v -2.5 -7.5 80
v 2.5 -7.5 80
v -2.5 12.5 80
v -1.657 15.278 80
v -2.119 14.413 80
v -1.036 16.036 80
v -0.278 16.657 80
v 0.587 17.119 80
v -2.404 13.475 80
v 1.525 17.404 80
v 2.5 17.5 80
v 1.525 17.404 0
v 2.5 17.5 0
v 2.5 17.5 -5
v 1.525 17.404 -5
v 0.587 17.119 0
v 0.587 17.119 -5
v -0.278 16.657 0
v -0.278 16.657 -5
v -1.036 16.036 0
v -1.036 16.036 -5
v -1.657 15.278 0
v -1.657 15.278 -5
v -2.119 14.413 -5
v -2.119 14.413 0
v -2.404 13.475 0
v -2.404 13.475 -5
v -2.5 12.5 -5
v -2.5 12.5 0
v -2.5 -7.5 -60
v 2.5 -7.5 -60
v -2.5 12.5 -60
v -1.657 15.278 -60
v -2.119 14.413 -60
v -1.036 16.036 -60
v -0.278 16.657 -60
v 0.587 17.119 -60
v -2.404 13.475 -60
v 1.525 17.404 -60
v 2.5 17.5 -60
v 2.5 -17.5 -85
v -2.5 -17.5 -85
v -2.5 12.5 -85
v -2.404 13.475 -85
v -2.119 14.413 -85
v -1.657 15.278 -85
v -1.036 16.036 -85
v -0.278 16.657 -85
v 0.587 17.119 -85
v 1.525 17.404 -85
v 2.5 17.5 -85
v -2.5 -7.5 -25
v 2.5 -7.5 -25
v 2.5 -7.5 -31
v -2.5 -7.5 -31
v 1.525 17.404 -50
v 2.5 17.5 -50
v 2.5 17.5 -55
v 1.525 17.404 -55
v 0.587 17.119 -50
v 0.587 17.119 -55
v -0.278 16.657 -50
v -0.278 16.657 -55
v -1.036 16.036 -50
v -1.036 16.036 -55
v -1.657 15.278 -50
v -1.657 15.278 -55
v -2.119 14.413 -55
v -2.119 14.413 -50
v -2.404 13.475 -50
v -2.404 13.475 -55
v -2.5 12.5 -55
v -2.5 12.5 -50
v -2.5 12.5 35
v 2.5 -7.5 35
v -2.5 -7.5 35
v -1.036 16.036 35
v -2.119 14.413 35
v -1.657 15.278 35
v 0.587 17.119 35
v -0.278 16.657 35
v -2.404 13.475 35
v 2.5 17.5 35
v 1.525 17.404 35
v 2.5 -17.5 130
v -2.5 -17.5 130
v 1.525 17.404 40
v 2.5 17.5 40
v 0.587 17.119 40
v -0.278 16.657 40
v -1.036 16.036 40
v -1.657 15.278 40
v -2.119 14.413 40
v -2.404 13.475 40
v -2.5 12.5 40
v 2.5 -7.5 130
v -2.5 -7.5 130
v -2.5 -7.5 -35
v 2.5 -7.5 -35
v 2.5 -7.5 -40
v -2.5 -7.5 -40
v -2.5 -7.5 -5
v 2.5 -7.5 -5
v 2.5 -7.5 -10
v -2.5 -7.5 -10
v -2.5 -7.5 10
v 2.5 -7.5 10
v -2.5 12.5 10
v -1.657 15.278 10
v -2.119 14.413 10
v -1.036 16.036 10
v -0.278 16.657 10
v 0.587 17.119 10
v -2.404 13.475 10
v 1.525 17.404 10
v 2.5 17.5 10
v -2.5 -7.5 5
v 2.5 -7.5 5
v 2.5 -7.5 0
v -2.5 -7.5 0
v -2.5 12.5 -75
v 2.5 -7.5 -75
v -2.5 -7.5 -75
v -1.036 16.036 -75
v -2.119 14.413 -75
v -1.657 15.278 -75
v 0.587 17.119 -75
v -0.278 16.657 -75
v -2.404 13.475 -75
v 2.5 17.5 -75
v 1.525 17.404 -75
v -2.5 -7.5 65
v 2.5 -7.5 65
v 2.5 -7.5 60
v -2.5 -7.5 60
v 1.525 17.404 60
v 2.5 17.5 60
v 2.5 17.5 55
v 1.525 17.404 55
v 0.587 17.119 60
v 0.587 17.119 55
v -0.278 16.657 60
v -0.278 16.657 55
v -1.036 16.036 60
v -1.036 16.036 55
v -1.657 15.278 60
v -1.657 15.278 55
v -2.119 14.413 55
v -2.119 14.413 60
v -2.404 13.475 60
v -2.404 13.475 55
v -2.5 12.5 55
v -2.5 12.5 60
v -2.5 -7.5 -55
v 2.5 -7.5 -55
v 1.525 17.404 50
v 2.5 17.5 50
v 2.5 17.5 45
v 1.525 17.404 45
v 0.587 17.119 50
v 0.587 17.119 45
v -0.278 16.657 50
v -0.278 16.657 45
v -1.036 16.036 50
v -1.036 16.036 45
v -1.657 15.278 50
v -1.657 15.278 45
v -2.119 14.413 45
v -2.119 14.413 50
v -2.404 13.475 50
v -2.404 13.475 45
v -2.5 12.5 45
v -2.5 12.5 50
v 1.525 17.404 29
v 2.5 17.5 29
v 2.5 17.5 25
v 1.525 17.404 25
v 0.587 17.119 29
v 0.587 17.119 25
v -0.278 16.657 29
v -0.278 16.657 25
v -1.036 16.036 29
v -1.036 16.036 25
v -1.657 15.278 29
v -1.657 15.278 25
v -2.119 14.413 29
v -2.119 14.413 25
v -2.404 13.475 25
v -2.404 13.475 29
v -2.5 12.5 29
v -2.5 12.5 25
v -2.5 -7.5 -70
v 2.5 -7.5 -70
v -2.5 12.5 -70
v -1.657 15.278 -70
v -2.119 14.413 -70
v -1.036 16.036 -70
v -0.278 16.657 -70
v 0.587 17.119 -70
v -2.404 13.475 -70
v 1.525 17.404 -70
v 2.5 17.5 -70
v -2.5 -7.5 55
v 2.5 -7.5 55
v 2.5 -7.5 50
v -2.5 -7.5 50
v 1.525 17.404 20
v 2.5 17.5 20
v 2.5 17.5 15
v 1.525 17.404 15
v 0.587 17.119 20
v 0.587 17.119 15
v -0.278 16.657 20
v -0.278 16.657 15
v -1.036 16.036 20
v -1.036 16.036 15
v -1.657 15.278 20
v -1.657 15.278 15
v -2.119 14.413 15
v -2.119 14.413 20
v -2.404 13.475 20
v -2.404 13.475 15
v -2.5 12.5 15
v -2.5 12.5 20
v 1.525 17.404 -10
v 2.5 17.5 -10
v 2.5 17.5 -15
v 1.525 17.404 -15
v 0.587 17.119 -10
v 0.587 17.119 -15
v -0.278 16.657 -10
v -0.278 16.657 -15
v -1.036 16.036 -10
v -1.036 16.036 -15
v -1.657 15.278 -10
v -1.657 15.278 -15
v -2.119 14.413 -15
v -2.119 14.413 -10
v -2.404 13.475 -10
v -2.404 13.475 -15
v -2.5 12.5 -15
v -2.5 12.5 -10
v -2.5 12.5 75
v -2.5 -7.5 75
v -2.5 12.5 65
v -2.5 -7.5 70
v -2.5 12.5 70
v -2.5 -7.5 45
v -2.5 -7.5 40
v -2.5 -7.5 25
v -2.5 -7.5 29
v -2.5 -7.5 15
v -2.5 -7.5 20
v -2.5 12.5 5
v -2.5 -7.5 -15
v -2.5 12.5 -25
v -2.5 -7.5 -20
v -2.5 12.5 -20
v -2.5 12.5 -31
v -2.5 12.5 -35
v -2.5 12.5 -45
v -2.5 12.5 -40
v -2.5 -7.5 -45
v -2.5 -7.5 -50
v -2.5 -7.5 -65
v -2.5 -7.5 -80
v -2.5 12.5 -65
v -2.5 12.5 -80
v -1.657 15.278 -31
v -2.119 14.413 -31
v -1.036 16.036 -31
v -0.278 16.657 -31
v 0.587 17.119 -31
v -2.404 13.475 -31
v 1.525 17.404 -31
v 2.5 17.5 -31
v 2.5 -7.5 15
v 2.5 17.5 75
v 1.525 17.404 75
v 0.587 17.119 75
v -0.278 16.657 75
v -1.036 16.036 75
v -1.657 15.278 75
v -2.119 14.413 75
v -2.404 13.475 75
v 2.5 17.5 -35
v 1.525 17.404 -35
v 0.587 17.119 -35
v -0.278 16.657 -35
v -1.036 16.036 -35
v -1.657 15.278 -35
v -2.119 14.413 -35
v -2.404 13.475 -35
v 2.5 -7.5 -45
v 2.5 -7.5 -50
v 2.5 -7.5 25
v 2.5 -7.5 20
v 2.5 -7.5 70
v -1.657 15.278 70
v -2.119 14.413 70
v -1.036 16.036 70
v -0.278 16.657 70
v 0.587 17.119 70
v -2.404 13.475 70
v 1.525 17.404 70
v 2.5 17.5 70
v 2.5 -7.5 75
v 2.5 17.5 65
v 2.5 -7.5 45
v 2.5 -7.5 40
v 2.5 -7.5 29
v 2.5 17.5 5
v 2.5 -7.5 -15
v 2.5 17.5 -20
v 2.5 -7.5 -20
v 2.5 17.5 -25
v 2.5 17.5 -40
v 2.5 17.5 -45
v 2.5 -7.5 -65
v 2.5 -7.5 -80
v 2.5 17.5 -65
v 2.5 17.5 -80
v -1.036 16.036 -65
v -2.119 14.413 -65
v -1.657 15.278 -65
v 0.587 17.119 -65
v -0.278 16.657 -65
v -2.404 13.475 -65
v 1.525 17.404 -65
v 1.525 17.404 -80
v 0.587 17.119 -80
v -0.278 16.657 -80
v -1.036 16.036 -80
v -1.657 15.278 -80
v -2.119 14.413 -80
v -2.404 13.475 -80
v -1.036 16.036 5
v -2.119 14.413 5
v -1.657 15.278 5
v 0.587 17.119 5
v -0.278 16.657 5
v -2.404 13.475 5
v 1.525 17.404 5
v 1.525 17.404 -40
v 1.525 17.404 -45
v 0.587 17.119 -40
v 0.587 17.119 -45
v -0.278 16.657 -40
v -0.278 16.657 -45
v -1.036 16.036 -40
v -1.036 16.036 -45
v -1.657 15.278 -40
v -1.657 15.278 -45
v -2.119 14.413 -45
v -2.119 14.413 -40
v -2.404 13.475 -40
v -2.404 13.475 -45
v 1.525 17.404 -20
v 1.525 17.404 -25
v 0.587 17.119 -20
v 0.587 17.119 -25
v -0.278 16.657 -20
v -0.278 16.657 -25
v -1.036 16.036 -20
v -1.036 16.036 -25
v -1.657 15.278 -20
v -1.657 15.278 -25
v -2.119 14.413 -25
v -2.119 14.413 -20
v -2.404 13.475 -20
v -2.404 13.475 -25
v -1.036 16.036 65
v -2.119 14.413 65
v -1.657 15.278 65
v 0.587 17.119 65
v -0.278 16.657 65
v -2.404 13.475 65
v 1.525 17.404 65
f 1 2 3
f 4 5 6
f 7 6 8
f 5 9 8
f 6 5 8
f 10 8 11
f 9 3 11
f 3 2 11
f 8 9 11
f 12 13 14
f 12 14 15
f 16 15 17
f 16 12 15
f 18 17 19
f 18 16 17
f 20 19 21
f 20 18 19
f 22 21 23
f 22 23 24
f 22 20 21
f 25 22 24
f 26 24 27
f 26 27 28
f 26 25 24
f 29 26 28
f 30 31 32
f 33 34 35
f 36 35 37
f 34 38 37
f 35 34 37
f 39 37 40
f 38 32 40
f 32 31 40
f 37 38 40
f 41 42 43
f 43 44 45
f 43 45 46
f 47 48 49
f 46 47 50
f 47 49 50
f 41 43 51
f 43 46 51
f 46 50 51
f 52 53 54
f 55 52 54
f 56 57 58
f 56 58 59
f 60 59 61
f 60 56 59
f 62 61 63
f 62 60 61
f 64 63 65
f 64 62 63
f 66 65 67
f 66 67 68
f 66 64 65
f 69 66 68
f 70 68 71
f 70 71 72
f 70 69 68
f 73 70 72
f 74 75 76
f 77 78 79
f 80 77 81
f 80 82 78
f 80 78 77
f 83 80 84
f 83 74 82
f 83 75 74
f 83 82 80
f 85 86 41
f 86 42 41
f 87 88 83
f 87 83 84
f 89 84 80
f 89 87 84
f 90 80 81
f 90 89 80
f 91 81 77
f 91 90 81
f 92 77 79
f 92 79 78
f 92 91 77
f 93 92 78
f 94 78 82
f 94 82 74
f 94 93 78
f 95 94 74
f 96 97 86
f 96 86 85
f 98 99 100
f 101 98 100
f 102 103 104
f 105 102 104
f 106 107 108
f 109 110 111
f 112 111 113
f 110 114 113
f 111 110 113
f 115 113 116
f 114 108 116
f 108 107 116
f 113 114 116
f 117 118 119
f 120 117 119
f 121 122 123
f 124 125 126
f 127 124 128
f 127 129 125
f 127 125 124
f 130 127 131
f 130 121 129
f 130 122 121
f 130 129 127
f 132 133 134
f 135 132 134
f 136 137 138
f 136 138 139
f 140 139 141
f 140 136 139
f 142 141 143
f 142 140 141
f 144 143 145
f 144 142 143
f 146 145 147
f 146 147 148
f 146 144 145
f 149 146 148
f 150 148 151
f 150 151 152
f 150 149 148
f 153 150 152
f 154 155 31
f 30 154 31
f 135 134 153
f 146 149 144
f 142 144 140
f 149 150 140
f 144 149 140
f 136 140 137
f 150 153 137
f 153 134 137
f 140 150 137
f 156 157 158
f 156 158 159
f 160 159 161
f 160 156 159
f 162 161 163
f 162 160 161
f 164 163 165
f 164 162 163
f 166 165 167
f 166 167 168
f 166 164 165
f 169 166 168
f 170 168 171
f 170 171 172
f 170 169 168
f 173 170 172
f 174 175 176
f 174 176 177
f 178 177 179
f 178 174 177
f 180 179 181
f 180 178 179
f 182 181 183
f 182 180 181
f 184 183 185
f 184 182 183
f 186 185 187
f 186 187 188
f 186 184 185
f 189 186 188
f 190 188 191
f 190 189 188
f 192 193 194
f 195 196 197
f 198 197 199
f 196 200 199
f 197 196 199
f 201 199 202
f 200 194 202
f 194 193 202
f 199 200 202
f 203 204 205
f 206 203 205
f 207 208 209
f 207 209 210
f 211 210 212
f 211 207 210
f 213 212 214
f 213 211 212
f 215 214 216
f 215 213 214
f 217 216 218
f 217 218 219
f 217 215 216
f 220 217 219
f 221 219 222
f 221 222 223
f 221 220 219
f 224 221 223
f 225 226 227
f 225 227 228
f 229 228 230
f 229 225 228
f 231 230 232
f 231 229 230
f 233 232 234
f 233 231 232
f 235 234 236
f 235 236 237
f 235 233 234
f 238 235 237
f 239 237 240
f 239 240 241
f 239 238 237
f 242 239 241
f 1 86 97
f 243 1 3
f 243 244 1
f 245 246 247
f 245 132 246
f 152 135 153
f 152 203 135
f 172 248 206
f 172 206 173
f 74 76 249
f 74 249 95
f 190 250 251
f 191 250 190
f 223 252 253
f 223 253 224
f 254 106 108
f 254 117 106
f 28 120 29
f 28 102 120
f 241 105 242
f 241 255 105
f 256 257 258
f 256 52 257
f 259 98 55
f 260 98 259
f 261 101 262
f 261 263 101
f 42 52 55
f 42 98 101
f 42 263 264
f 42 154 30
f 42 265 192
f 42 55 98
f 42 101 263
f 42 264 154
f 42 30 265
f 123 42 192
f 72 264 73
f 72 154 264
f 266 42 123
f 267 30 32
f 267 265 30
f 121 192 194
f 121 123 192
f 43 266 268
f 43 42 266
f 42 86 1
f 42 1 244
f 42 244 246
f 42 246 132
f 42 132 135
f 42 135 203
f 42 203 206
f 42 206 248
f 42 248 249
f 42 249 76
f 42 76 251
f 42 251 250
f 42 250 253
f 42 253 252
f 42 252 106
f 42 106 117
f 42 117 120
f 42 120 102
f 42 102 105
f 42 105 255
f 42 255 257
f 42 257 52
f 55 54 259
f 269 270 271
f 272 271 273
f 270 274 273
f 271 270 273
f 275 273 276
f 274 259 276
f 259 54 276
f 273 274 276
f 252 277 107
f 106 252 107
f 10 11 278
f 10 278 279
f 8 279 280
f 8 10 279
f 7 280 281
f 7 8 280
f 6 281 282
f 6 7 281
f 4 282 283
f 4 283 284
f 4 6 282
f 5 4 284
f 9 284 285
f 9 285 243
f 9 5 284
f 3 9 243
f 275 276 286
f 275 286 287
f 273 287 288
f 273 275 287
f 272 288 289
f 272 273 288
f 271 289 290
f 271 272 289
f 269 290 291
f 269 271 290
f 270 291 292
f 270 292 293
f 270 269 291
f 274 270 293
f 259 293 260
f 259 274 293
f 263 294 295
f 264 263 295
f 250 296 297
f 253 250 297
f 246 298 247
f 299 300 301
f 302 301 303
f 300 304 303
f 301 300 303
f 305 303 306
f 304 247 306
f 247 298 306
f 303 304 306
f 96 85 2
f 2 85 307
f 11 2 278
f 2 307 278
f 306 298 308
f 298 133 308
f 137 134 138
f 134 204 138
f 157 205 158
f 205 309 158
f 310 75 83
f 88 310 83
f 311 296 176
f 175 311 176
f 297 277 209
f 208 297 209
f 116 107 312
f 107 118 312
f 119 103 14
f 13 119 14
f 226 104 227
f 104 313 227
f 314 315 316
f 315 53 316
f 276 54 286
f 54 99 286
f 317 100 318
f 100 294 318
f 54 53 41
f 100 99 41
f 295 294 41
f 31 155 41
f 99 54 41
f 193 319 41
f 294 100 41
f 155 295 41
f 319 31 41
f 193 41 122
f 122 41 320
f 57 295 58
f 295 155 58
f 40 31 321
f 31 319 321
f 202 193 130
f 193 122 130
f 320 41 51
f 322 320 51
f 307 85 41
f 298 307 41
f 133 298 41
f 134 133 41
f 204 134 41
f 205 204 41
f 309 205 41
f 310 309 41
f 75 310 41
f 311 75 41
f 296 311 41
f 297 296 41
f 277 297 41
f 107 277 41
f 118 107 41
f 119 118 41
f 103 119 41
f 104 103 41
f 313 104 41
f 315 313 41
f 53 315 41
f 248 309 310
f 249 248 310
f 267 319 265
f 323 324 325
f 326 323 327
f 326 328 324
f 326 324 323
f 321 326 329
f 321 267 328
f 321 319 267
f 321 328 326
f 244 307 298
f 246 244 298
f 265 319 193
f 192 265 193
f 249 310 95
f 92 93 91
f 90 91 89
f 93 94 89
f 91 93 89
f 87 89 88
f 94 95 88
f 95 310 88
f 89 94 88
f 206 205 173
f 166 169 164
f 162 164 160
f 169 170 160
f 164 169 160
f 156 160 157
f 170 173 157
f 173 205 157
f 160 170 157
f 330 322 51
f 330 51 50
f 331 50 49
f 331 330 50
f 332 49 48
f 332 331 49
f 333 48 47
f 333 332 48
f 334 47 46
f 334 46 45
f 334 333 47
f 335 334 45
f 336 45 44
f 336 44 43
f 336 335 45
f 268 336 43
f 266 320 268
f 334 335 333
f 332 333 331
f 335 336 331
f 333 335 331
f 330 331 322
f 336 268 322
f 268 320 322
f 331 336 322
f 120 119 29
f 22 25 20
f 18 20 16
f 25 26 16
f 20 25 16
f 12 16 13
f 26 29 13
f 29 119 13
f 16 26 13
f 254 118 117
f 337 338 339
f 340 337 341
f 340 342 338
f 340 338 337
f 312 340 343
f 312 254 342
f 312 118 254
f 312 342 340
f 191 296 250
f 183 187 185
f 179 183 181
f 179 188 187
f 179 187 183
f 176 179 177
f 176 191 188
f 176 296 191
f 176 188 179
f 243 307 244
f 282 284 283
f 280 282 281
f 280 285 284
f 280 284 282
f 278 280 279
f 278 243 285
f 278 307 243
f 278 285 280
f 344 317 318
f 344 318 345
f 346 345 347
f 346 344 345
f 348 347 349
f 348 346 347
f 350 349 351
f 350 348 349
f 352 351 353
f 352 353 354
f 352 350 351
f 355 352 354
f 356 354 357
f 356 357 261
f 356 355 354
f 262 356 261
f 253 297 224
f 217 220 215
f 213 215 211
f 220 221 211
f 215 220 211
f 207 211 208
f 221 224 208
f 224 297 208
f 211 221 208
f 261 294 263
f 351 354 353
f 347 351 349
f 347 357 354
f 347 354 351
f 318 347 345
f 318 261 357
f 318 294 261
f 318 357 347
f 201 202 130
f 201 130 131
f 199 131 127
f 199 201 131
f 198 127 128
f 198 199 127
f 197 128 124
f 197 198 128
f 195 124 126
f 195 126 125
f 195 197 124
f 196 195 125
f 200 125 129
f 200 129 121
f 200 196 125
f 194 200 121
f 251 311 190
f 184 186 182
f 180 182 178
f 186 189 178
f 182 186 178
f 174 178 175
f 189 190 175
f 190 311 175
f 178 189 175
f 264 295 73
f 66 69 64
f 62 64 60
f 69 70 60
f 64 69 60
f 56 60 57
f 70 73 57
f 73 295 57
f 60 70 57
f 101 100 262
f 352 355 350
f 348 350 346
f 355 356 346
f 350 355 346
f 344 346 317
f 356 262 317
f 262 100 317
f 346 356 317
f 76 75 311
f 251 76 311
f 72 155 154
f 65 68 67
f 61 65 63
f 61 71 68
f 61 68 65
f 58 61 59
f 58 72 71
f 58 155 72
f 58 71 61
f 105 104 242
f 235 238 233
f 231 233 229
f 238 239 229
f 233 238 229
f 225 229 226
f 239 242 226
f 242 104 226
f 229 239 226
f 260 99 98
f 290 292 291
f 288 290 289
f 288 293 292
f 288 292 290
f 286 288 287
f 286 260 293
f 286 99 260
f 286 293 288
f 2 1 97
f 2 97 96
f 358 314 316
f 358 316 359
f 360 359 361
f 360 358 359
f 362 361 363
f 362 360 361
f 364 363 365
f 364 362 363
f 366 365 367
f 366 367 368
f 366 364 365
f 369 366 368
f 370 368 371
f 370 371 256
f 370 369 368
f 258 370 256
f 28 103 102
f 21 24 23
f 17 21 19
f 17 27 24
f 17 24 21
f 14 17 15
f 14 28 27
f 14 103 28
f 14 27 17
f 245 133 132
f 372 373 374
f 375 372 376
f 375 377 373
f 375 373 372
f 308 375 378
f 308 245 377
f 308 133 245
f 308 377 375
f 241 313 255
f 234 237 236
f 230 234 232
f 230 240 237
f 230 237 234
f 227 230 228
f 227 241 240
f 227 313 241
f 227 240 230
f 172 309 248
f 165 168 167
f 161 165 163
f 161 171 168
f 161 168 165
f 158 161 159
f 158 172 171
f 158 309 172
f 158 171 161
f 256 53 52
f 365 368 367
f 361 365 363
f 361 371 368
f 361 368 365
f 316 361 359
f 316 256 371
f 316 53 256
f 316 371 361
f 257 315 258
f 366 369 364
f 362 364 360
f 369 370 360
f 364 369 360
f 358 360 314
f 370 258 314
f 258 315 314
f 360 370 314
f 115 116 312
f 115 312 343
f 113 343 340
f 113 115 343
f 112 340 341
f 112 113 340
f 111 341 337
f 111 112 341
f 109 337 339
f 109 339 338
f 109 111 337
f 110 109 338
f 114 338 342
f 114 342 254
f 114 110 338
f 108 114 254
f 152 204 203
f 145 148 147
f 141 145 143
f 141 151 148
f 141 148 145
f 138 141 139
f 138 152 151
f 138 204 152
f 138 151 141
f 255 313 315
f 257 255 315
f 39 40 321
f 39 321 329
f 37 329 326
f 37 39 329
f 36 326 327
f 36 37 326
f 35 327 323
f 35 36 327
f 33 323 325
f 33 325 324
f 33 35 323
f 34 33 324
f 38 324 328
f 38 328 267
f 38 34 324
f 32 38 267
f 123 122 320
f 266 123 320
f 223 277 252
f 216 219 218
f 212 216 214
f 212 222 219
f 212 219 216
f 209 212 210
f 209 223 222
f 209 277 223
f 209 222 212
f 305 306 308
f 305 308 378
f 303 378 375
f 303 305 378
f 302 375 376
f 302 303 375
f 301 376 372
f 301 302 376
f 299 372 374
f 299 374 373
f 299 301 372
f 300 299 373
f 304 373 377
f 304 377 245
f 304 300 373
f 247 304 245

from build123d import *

# Parameters (mm, degrees)
SALIENTE_EXTRUIR1_DEPTH = 85
CROQUIS2_W              = 5
CROQUIS2_H              = 25
CORTAR_EXTRUIR1_DEPTH   = 6
CROQUIS3_W              = 5
CROQUIS3_H              = 10
SALIENTE_EXTRUIR2_DEPTH = 45
CROQUIS4_W              = 1
CROQUIS4_H              = 25
CORTAR_EXTRUIR2_DEPTH   = 6


with BuildPart() as part:
    # Croquis1 → Saliente-Extruir1 (new body, symmetric)
    with BuildSketch(Plane.XY):
        with BuildLine():
            Line((-2.5, -17.5), (2.5, -17.5))
            Line((2.5, -17.5), (2.5, 17.5))
            ThreePointArc((2.5, 17.5), (-1.035533906, 16.035533906), (-2.5, 12.5))
            Line((-2.5, 12.5), (-2.5, -17.5))
        make_face()
    extrude(amount=SALIENTE_EXTRUIR1_DEPTH, both=True)

    # Croquis2 → Cortar-Extruir1 (cut, through all)
    with BuildSketch(Plane(origin=(2.5, 0, 0), x_dir=(0, 0, -1), z_dir=(1, 0, 0))):
        with Locations((77.5, 5)):
            Rectangle(CROQUIS2_W, CROQUIS2_H)
        with Locations((67.5, 5)):
            Rectangle(CROQUIS2_W, CROQUIS2_H)
        with Locations((57.5, 5)):
            Rectangle(CROQUIS2_W, CROQUIS2_H)
        with Locations((47.5, 5)):
            Rectangle(CROQUIS2_W, CROQUIS2_H)
        with Locations((37.5, 5)):
            Rectangle(CROQUIS2_W, CROQUIS2_H)
        with Locations((27.5, 5)):
            Rectangle(CROQUIS2_W, CROQUIS2_H)
        with Locations((17.5, 5)):
            Rectangle(CROQUIS2_W, CROQUIS2_H)
        with Locations((7.5, 5)):
            Rectangle(CROQUIS2_W, CROQUIS2_H)
        with Locations((-2.5, 5)):
            Rectangle(CROQUIS2_W, CROQUIS2_H)
        with Locations((-12.5, 5)):
            Rectangle(CROQUIS2_W, CROQUIS2_H)
        with Locations((-22.5, 5)):
            Rectangle(CROQUIS2_W, CROQUIS2_H)
        with Locations((-32.5, 5)):
            Rectangle(CROQUIS2_W, CROQUIS2_H)
        with Locations((-42.5, 5)):
            Rectangle(CROQUIS2_W, CROQUIS2_H)
        with Locations((-52.5, 5)):
            Rectangle(CROQUIS2_W, CROQUIS2_H)
        with Locations((-62.5, 5)):
            Rectangle(CROQUIS2_W, CROQUIS2_H)
        with Locations((-72.5, 5)):
            Rectangle(CROQUIS2_W, CROQUIS2_H)
        with Locations((-82.5, 5)):
            Rectangle(CROQUIS2_W, CROQUIS2_H)
    extrude(amount=-CORTAR_EXTRUIR1_DEPTH, mode=Mode.SUBTRACT)

    # Croquis3 → Saliente-Extruir2 (add)
    with BuildSketch(Plane.XY.offset(85)):
        with Locations((0, -12.5)):
            Rectangle(CROQUIS3_W, CROQUIS3_H)
    extrude(amount=SALIENTE_EXTRUIR2_DEPTH)

    # Croquis4 → Cortar-Extruir2 (cut, through all)
    with BuildSketch(Plane(origin=(2.5, 0, 0), x_dir=(0, 0, -1), z_dir=(1, 0, 0))):
        with Locations((-29.5, 5)):
            Rectangle(CROQUIS4_W, CROQUIS4_H)
        with Locations((30.5, 5)):
            Rectangle(CROQUIS4_W, CROQUIS4_H)
    extrude(amount=-CORTAR_EXTRUIR2_DEPTH, mode=Mode.SUBTRACT)


solid = part.part
